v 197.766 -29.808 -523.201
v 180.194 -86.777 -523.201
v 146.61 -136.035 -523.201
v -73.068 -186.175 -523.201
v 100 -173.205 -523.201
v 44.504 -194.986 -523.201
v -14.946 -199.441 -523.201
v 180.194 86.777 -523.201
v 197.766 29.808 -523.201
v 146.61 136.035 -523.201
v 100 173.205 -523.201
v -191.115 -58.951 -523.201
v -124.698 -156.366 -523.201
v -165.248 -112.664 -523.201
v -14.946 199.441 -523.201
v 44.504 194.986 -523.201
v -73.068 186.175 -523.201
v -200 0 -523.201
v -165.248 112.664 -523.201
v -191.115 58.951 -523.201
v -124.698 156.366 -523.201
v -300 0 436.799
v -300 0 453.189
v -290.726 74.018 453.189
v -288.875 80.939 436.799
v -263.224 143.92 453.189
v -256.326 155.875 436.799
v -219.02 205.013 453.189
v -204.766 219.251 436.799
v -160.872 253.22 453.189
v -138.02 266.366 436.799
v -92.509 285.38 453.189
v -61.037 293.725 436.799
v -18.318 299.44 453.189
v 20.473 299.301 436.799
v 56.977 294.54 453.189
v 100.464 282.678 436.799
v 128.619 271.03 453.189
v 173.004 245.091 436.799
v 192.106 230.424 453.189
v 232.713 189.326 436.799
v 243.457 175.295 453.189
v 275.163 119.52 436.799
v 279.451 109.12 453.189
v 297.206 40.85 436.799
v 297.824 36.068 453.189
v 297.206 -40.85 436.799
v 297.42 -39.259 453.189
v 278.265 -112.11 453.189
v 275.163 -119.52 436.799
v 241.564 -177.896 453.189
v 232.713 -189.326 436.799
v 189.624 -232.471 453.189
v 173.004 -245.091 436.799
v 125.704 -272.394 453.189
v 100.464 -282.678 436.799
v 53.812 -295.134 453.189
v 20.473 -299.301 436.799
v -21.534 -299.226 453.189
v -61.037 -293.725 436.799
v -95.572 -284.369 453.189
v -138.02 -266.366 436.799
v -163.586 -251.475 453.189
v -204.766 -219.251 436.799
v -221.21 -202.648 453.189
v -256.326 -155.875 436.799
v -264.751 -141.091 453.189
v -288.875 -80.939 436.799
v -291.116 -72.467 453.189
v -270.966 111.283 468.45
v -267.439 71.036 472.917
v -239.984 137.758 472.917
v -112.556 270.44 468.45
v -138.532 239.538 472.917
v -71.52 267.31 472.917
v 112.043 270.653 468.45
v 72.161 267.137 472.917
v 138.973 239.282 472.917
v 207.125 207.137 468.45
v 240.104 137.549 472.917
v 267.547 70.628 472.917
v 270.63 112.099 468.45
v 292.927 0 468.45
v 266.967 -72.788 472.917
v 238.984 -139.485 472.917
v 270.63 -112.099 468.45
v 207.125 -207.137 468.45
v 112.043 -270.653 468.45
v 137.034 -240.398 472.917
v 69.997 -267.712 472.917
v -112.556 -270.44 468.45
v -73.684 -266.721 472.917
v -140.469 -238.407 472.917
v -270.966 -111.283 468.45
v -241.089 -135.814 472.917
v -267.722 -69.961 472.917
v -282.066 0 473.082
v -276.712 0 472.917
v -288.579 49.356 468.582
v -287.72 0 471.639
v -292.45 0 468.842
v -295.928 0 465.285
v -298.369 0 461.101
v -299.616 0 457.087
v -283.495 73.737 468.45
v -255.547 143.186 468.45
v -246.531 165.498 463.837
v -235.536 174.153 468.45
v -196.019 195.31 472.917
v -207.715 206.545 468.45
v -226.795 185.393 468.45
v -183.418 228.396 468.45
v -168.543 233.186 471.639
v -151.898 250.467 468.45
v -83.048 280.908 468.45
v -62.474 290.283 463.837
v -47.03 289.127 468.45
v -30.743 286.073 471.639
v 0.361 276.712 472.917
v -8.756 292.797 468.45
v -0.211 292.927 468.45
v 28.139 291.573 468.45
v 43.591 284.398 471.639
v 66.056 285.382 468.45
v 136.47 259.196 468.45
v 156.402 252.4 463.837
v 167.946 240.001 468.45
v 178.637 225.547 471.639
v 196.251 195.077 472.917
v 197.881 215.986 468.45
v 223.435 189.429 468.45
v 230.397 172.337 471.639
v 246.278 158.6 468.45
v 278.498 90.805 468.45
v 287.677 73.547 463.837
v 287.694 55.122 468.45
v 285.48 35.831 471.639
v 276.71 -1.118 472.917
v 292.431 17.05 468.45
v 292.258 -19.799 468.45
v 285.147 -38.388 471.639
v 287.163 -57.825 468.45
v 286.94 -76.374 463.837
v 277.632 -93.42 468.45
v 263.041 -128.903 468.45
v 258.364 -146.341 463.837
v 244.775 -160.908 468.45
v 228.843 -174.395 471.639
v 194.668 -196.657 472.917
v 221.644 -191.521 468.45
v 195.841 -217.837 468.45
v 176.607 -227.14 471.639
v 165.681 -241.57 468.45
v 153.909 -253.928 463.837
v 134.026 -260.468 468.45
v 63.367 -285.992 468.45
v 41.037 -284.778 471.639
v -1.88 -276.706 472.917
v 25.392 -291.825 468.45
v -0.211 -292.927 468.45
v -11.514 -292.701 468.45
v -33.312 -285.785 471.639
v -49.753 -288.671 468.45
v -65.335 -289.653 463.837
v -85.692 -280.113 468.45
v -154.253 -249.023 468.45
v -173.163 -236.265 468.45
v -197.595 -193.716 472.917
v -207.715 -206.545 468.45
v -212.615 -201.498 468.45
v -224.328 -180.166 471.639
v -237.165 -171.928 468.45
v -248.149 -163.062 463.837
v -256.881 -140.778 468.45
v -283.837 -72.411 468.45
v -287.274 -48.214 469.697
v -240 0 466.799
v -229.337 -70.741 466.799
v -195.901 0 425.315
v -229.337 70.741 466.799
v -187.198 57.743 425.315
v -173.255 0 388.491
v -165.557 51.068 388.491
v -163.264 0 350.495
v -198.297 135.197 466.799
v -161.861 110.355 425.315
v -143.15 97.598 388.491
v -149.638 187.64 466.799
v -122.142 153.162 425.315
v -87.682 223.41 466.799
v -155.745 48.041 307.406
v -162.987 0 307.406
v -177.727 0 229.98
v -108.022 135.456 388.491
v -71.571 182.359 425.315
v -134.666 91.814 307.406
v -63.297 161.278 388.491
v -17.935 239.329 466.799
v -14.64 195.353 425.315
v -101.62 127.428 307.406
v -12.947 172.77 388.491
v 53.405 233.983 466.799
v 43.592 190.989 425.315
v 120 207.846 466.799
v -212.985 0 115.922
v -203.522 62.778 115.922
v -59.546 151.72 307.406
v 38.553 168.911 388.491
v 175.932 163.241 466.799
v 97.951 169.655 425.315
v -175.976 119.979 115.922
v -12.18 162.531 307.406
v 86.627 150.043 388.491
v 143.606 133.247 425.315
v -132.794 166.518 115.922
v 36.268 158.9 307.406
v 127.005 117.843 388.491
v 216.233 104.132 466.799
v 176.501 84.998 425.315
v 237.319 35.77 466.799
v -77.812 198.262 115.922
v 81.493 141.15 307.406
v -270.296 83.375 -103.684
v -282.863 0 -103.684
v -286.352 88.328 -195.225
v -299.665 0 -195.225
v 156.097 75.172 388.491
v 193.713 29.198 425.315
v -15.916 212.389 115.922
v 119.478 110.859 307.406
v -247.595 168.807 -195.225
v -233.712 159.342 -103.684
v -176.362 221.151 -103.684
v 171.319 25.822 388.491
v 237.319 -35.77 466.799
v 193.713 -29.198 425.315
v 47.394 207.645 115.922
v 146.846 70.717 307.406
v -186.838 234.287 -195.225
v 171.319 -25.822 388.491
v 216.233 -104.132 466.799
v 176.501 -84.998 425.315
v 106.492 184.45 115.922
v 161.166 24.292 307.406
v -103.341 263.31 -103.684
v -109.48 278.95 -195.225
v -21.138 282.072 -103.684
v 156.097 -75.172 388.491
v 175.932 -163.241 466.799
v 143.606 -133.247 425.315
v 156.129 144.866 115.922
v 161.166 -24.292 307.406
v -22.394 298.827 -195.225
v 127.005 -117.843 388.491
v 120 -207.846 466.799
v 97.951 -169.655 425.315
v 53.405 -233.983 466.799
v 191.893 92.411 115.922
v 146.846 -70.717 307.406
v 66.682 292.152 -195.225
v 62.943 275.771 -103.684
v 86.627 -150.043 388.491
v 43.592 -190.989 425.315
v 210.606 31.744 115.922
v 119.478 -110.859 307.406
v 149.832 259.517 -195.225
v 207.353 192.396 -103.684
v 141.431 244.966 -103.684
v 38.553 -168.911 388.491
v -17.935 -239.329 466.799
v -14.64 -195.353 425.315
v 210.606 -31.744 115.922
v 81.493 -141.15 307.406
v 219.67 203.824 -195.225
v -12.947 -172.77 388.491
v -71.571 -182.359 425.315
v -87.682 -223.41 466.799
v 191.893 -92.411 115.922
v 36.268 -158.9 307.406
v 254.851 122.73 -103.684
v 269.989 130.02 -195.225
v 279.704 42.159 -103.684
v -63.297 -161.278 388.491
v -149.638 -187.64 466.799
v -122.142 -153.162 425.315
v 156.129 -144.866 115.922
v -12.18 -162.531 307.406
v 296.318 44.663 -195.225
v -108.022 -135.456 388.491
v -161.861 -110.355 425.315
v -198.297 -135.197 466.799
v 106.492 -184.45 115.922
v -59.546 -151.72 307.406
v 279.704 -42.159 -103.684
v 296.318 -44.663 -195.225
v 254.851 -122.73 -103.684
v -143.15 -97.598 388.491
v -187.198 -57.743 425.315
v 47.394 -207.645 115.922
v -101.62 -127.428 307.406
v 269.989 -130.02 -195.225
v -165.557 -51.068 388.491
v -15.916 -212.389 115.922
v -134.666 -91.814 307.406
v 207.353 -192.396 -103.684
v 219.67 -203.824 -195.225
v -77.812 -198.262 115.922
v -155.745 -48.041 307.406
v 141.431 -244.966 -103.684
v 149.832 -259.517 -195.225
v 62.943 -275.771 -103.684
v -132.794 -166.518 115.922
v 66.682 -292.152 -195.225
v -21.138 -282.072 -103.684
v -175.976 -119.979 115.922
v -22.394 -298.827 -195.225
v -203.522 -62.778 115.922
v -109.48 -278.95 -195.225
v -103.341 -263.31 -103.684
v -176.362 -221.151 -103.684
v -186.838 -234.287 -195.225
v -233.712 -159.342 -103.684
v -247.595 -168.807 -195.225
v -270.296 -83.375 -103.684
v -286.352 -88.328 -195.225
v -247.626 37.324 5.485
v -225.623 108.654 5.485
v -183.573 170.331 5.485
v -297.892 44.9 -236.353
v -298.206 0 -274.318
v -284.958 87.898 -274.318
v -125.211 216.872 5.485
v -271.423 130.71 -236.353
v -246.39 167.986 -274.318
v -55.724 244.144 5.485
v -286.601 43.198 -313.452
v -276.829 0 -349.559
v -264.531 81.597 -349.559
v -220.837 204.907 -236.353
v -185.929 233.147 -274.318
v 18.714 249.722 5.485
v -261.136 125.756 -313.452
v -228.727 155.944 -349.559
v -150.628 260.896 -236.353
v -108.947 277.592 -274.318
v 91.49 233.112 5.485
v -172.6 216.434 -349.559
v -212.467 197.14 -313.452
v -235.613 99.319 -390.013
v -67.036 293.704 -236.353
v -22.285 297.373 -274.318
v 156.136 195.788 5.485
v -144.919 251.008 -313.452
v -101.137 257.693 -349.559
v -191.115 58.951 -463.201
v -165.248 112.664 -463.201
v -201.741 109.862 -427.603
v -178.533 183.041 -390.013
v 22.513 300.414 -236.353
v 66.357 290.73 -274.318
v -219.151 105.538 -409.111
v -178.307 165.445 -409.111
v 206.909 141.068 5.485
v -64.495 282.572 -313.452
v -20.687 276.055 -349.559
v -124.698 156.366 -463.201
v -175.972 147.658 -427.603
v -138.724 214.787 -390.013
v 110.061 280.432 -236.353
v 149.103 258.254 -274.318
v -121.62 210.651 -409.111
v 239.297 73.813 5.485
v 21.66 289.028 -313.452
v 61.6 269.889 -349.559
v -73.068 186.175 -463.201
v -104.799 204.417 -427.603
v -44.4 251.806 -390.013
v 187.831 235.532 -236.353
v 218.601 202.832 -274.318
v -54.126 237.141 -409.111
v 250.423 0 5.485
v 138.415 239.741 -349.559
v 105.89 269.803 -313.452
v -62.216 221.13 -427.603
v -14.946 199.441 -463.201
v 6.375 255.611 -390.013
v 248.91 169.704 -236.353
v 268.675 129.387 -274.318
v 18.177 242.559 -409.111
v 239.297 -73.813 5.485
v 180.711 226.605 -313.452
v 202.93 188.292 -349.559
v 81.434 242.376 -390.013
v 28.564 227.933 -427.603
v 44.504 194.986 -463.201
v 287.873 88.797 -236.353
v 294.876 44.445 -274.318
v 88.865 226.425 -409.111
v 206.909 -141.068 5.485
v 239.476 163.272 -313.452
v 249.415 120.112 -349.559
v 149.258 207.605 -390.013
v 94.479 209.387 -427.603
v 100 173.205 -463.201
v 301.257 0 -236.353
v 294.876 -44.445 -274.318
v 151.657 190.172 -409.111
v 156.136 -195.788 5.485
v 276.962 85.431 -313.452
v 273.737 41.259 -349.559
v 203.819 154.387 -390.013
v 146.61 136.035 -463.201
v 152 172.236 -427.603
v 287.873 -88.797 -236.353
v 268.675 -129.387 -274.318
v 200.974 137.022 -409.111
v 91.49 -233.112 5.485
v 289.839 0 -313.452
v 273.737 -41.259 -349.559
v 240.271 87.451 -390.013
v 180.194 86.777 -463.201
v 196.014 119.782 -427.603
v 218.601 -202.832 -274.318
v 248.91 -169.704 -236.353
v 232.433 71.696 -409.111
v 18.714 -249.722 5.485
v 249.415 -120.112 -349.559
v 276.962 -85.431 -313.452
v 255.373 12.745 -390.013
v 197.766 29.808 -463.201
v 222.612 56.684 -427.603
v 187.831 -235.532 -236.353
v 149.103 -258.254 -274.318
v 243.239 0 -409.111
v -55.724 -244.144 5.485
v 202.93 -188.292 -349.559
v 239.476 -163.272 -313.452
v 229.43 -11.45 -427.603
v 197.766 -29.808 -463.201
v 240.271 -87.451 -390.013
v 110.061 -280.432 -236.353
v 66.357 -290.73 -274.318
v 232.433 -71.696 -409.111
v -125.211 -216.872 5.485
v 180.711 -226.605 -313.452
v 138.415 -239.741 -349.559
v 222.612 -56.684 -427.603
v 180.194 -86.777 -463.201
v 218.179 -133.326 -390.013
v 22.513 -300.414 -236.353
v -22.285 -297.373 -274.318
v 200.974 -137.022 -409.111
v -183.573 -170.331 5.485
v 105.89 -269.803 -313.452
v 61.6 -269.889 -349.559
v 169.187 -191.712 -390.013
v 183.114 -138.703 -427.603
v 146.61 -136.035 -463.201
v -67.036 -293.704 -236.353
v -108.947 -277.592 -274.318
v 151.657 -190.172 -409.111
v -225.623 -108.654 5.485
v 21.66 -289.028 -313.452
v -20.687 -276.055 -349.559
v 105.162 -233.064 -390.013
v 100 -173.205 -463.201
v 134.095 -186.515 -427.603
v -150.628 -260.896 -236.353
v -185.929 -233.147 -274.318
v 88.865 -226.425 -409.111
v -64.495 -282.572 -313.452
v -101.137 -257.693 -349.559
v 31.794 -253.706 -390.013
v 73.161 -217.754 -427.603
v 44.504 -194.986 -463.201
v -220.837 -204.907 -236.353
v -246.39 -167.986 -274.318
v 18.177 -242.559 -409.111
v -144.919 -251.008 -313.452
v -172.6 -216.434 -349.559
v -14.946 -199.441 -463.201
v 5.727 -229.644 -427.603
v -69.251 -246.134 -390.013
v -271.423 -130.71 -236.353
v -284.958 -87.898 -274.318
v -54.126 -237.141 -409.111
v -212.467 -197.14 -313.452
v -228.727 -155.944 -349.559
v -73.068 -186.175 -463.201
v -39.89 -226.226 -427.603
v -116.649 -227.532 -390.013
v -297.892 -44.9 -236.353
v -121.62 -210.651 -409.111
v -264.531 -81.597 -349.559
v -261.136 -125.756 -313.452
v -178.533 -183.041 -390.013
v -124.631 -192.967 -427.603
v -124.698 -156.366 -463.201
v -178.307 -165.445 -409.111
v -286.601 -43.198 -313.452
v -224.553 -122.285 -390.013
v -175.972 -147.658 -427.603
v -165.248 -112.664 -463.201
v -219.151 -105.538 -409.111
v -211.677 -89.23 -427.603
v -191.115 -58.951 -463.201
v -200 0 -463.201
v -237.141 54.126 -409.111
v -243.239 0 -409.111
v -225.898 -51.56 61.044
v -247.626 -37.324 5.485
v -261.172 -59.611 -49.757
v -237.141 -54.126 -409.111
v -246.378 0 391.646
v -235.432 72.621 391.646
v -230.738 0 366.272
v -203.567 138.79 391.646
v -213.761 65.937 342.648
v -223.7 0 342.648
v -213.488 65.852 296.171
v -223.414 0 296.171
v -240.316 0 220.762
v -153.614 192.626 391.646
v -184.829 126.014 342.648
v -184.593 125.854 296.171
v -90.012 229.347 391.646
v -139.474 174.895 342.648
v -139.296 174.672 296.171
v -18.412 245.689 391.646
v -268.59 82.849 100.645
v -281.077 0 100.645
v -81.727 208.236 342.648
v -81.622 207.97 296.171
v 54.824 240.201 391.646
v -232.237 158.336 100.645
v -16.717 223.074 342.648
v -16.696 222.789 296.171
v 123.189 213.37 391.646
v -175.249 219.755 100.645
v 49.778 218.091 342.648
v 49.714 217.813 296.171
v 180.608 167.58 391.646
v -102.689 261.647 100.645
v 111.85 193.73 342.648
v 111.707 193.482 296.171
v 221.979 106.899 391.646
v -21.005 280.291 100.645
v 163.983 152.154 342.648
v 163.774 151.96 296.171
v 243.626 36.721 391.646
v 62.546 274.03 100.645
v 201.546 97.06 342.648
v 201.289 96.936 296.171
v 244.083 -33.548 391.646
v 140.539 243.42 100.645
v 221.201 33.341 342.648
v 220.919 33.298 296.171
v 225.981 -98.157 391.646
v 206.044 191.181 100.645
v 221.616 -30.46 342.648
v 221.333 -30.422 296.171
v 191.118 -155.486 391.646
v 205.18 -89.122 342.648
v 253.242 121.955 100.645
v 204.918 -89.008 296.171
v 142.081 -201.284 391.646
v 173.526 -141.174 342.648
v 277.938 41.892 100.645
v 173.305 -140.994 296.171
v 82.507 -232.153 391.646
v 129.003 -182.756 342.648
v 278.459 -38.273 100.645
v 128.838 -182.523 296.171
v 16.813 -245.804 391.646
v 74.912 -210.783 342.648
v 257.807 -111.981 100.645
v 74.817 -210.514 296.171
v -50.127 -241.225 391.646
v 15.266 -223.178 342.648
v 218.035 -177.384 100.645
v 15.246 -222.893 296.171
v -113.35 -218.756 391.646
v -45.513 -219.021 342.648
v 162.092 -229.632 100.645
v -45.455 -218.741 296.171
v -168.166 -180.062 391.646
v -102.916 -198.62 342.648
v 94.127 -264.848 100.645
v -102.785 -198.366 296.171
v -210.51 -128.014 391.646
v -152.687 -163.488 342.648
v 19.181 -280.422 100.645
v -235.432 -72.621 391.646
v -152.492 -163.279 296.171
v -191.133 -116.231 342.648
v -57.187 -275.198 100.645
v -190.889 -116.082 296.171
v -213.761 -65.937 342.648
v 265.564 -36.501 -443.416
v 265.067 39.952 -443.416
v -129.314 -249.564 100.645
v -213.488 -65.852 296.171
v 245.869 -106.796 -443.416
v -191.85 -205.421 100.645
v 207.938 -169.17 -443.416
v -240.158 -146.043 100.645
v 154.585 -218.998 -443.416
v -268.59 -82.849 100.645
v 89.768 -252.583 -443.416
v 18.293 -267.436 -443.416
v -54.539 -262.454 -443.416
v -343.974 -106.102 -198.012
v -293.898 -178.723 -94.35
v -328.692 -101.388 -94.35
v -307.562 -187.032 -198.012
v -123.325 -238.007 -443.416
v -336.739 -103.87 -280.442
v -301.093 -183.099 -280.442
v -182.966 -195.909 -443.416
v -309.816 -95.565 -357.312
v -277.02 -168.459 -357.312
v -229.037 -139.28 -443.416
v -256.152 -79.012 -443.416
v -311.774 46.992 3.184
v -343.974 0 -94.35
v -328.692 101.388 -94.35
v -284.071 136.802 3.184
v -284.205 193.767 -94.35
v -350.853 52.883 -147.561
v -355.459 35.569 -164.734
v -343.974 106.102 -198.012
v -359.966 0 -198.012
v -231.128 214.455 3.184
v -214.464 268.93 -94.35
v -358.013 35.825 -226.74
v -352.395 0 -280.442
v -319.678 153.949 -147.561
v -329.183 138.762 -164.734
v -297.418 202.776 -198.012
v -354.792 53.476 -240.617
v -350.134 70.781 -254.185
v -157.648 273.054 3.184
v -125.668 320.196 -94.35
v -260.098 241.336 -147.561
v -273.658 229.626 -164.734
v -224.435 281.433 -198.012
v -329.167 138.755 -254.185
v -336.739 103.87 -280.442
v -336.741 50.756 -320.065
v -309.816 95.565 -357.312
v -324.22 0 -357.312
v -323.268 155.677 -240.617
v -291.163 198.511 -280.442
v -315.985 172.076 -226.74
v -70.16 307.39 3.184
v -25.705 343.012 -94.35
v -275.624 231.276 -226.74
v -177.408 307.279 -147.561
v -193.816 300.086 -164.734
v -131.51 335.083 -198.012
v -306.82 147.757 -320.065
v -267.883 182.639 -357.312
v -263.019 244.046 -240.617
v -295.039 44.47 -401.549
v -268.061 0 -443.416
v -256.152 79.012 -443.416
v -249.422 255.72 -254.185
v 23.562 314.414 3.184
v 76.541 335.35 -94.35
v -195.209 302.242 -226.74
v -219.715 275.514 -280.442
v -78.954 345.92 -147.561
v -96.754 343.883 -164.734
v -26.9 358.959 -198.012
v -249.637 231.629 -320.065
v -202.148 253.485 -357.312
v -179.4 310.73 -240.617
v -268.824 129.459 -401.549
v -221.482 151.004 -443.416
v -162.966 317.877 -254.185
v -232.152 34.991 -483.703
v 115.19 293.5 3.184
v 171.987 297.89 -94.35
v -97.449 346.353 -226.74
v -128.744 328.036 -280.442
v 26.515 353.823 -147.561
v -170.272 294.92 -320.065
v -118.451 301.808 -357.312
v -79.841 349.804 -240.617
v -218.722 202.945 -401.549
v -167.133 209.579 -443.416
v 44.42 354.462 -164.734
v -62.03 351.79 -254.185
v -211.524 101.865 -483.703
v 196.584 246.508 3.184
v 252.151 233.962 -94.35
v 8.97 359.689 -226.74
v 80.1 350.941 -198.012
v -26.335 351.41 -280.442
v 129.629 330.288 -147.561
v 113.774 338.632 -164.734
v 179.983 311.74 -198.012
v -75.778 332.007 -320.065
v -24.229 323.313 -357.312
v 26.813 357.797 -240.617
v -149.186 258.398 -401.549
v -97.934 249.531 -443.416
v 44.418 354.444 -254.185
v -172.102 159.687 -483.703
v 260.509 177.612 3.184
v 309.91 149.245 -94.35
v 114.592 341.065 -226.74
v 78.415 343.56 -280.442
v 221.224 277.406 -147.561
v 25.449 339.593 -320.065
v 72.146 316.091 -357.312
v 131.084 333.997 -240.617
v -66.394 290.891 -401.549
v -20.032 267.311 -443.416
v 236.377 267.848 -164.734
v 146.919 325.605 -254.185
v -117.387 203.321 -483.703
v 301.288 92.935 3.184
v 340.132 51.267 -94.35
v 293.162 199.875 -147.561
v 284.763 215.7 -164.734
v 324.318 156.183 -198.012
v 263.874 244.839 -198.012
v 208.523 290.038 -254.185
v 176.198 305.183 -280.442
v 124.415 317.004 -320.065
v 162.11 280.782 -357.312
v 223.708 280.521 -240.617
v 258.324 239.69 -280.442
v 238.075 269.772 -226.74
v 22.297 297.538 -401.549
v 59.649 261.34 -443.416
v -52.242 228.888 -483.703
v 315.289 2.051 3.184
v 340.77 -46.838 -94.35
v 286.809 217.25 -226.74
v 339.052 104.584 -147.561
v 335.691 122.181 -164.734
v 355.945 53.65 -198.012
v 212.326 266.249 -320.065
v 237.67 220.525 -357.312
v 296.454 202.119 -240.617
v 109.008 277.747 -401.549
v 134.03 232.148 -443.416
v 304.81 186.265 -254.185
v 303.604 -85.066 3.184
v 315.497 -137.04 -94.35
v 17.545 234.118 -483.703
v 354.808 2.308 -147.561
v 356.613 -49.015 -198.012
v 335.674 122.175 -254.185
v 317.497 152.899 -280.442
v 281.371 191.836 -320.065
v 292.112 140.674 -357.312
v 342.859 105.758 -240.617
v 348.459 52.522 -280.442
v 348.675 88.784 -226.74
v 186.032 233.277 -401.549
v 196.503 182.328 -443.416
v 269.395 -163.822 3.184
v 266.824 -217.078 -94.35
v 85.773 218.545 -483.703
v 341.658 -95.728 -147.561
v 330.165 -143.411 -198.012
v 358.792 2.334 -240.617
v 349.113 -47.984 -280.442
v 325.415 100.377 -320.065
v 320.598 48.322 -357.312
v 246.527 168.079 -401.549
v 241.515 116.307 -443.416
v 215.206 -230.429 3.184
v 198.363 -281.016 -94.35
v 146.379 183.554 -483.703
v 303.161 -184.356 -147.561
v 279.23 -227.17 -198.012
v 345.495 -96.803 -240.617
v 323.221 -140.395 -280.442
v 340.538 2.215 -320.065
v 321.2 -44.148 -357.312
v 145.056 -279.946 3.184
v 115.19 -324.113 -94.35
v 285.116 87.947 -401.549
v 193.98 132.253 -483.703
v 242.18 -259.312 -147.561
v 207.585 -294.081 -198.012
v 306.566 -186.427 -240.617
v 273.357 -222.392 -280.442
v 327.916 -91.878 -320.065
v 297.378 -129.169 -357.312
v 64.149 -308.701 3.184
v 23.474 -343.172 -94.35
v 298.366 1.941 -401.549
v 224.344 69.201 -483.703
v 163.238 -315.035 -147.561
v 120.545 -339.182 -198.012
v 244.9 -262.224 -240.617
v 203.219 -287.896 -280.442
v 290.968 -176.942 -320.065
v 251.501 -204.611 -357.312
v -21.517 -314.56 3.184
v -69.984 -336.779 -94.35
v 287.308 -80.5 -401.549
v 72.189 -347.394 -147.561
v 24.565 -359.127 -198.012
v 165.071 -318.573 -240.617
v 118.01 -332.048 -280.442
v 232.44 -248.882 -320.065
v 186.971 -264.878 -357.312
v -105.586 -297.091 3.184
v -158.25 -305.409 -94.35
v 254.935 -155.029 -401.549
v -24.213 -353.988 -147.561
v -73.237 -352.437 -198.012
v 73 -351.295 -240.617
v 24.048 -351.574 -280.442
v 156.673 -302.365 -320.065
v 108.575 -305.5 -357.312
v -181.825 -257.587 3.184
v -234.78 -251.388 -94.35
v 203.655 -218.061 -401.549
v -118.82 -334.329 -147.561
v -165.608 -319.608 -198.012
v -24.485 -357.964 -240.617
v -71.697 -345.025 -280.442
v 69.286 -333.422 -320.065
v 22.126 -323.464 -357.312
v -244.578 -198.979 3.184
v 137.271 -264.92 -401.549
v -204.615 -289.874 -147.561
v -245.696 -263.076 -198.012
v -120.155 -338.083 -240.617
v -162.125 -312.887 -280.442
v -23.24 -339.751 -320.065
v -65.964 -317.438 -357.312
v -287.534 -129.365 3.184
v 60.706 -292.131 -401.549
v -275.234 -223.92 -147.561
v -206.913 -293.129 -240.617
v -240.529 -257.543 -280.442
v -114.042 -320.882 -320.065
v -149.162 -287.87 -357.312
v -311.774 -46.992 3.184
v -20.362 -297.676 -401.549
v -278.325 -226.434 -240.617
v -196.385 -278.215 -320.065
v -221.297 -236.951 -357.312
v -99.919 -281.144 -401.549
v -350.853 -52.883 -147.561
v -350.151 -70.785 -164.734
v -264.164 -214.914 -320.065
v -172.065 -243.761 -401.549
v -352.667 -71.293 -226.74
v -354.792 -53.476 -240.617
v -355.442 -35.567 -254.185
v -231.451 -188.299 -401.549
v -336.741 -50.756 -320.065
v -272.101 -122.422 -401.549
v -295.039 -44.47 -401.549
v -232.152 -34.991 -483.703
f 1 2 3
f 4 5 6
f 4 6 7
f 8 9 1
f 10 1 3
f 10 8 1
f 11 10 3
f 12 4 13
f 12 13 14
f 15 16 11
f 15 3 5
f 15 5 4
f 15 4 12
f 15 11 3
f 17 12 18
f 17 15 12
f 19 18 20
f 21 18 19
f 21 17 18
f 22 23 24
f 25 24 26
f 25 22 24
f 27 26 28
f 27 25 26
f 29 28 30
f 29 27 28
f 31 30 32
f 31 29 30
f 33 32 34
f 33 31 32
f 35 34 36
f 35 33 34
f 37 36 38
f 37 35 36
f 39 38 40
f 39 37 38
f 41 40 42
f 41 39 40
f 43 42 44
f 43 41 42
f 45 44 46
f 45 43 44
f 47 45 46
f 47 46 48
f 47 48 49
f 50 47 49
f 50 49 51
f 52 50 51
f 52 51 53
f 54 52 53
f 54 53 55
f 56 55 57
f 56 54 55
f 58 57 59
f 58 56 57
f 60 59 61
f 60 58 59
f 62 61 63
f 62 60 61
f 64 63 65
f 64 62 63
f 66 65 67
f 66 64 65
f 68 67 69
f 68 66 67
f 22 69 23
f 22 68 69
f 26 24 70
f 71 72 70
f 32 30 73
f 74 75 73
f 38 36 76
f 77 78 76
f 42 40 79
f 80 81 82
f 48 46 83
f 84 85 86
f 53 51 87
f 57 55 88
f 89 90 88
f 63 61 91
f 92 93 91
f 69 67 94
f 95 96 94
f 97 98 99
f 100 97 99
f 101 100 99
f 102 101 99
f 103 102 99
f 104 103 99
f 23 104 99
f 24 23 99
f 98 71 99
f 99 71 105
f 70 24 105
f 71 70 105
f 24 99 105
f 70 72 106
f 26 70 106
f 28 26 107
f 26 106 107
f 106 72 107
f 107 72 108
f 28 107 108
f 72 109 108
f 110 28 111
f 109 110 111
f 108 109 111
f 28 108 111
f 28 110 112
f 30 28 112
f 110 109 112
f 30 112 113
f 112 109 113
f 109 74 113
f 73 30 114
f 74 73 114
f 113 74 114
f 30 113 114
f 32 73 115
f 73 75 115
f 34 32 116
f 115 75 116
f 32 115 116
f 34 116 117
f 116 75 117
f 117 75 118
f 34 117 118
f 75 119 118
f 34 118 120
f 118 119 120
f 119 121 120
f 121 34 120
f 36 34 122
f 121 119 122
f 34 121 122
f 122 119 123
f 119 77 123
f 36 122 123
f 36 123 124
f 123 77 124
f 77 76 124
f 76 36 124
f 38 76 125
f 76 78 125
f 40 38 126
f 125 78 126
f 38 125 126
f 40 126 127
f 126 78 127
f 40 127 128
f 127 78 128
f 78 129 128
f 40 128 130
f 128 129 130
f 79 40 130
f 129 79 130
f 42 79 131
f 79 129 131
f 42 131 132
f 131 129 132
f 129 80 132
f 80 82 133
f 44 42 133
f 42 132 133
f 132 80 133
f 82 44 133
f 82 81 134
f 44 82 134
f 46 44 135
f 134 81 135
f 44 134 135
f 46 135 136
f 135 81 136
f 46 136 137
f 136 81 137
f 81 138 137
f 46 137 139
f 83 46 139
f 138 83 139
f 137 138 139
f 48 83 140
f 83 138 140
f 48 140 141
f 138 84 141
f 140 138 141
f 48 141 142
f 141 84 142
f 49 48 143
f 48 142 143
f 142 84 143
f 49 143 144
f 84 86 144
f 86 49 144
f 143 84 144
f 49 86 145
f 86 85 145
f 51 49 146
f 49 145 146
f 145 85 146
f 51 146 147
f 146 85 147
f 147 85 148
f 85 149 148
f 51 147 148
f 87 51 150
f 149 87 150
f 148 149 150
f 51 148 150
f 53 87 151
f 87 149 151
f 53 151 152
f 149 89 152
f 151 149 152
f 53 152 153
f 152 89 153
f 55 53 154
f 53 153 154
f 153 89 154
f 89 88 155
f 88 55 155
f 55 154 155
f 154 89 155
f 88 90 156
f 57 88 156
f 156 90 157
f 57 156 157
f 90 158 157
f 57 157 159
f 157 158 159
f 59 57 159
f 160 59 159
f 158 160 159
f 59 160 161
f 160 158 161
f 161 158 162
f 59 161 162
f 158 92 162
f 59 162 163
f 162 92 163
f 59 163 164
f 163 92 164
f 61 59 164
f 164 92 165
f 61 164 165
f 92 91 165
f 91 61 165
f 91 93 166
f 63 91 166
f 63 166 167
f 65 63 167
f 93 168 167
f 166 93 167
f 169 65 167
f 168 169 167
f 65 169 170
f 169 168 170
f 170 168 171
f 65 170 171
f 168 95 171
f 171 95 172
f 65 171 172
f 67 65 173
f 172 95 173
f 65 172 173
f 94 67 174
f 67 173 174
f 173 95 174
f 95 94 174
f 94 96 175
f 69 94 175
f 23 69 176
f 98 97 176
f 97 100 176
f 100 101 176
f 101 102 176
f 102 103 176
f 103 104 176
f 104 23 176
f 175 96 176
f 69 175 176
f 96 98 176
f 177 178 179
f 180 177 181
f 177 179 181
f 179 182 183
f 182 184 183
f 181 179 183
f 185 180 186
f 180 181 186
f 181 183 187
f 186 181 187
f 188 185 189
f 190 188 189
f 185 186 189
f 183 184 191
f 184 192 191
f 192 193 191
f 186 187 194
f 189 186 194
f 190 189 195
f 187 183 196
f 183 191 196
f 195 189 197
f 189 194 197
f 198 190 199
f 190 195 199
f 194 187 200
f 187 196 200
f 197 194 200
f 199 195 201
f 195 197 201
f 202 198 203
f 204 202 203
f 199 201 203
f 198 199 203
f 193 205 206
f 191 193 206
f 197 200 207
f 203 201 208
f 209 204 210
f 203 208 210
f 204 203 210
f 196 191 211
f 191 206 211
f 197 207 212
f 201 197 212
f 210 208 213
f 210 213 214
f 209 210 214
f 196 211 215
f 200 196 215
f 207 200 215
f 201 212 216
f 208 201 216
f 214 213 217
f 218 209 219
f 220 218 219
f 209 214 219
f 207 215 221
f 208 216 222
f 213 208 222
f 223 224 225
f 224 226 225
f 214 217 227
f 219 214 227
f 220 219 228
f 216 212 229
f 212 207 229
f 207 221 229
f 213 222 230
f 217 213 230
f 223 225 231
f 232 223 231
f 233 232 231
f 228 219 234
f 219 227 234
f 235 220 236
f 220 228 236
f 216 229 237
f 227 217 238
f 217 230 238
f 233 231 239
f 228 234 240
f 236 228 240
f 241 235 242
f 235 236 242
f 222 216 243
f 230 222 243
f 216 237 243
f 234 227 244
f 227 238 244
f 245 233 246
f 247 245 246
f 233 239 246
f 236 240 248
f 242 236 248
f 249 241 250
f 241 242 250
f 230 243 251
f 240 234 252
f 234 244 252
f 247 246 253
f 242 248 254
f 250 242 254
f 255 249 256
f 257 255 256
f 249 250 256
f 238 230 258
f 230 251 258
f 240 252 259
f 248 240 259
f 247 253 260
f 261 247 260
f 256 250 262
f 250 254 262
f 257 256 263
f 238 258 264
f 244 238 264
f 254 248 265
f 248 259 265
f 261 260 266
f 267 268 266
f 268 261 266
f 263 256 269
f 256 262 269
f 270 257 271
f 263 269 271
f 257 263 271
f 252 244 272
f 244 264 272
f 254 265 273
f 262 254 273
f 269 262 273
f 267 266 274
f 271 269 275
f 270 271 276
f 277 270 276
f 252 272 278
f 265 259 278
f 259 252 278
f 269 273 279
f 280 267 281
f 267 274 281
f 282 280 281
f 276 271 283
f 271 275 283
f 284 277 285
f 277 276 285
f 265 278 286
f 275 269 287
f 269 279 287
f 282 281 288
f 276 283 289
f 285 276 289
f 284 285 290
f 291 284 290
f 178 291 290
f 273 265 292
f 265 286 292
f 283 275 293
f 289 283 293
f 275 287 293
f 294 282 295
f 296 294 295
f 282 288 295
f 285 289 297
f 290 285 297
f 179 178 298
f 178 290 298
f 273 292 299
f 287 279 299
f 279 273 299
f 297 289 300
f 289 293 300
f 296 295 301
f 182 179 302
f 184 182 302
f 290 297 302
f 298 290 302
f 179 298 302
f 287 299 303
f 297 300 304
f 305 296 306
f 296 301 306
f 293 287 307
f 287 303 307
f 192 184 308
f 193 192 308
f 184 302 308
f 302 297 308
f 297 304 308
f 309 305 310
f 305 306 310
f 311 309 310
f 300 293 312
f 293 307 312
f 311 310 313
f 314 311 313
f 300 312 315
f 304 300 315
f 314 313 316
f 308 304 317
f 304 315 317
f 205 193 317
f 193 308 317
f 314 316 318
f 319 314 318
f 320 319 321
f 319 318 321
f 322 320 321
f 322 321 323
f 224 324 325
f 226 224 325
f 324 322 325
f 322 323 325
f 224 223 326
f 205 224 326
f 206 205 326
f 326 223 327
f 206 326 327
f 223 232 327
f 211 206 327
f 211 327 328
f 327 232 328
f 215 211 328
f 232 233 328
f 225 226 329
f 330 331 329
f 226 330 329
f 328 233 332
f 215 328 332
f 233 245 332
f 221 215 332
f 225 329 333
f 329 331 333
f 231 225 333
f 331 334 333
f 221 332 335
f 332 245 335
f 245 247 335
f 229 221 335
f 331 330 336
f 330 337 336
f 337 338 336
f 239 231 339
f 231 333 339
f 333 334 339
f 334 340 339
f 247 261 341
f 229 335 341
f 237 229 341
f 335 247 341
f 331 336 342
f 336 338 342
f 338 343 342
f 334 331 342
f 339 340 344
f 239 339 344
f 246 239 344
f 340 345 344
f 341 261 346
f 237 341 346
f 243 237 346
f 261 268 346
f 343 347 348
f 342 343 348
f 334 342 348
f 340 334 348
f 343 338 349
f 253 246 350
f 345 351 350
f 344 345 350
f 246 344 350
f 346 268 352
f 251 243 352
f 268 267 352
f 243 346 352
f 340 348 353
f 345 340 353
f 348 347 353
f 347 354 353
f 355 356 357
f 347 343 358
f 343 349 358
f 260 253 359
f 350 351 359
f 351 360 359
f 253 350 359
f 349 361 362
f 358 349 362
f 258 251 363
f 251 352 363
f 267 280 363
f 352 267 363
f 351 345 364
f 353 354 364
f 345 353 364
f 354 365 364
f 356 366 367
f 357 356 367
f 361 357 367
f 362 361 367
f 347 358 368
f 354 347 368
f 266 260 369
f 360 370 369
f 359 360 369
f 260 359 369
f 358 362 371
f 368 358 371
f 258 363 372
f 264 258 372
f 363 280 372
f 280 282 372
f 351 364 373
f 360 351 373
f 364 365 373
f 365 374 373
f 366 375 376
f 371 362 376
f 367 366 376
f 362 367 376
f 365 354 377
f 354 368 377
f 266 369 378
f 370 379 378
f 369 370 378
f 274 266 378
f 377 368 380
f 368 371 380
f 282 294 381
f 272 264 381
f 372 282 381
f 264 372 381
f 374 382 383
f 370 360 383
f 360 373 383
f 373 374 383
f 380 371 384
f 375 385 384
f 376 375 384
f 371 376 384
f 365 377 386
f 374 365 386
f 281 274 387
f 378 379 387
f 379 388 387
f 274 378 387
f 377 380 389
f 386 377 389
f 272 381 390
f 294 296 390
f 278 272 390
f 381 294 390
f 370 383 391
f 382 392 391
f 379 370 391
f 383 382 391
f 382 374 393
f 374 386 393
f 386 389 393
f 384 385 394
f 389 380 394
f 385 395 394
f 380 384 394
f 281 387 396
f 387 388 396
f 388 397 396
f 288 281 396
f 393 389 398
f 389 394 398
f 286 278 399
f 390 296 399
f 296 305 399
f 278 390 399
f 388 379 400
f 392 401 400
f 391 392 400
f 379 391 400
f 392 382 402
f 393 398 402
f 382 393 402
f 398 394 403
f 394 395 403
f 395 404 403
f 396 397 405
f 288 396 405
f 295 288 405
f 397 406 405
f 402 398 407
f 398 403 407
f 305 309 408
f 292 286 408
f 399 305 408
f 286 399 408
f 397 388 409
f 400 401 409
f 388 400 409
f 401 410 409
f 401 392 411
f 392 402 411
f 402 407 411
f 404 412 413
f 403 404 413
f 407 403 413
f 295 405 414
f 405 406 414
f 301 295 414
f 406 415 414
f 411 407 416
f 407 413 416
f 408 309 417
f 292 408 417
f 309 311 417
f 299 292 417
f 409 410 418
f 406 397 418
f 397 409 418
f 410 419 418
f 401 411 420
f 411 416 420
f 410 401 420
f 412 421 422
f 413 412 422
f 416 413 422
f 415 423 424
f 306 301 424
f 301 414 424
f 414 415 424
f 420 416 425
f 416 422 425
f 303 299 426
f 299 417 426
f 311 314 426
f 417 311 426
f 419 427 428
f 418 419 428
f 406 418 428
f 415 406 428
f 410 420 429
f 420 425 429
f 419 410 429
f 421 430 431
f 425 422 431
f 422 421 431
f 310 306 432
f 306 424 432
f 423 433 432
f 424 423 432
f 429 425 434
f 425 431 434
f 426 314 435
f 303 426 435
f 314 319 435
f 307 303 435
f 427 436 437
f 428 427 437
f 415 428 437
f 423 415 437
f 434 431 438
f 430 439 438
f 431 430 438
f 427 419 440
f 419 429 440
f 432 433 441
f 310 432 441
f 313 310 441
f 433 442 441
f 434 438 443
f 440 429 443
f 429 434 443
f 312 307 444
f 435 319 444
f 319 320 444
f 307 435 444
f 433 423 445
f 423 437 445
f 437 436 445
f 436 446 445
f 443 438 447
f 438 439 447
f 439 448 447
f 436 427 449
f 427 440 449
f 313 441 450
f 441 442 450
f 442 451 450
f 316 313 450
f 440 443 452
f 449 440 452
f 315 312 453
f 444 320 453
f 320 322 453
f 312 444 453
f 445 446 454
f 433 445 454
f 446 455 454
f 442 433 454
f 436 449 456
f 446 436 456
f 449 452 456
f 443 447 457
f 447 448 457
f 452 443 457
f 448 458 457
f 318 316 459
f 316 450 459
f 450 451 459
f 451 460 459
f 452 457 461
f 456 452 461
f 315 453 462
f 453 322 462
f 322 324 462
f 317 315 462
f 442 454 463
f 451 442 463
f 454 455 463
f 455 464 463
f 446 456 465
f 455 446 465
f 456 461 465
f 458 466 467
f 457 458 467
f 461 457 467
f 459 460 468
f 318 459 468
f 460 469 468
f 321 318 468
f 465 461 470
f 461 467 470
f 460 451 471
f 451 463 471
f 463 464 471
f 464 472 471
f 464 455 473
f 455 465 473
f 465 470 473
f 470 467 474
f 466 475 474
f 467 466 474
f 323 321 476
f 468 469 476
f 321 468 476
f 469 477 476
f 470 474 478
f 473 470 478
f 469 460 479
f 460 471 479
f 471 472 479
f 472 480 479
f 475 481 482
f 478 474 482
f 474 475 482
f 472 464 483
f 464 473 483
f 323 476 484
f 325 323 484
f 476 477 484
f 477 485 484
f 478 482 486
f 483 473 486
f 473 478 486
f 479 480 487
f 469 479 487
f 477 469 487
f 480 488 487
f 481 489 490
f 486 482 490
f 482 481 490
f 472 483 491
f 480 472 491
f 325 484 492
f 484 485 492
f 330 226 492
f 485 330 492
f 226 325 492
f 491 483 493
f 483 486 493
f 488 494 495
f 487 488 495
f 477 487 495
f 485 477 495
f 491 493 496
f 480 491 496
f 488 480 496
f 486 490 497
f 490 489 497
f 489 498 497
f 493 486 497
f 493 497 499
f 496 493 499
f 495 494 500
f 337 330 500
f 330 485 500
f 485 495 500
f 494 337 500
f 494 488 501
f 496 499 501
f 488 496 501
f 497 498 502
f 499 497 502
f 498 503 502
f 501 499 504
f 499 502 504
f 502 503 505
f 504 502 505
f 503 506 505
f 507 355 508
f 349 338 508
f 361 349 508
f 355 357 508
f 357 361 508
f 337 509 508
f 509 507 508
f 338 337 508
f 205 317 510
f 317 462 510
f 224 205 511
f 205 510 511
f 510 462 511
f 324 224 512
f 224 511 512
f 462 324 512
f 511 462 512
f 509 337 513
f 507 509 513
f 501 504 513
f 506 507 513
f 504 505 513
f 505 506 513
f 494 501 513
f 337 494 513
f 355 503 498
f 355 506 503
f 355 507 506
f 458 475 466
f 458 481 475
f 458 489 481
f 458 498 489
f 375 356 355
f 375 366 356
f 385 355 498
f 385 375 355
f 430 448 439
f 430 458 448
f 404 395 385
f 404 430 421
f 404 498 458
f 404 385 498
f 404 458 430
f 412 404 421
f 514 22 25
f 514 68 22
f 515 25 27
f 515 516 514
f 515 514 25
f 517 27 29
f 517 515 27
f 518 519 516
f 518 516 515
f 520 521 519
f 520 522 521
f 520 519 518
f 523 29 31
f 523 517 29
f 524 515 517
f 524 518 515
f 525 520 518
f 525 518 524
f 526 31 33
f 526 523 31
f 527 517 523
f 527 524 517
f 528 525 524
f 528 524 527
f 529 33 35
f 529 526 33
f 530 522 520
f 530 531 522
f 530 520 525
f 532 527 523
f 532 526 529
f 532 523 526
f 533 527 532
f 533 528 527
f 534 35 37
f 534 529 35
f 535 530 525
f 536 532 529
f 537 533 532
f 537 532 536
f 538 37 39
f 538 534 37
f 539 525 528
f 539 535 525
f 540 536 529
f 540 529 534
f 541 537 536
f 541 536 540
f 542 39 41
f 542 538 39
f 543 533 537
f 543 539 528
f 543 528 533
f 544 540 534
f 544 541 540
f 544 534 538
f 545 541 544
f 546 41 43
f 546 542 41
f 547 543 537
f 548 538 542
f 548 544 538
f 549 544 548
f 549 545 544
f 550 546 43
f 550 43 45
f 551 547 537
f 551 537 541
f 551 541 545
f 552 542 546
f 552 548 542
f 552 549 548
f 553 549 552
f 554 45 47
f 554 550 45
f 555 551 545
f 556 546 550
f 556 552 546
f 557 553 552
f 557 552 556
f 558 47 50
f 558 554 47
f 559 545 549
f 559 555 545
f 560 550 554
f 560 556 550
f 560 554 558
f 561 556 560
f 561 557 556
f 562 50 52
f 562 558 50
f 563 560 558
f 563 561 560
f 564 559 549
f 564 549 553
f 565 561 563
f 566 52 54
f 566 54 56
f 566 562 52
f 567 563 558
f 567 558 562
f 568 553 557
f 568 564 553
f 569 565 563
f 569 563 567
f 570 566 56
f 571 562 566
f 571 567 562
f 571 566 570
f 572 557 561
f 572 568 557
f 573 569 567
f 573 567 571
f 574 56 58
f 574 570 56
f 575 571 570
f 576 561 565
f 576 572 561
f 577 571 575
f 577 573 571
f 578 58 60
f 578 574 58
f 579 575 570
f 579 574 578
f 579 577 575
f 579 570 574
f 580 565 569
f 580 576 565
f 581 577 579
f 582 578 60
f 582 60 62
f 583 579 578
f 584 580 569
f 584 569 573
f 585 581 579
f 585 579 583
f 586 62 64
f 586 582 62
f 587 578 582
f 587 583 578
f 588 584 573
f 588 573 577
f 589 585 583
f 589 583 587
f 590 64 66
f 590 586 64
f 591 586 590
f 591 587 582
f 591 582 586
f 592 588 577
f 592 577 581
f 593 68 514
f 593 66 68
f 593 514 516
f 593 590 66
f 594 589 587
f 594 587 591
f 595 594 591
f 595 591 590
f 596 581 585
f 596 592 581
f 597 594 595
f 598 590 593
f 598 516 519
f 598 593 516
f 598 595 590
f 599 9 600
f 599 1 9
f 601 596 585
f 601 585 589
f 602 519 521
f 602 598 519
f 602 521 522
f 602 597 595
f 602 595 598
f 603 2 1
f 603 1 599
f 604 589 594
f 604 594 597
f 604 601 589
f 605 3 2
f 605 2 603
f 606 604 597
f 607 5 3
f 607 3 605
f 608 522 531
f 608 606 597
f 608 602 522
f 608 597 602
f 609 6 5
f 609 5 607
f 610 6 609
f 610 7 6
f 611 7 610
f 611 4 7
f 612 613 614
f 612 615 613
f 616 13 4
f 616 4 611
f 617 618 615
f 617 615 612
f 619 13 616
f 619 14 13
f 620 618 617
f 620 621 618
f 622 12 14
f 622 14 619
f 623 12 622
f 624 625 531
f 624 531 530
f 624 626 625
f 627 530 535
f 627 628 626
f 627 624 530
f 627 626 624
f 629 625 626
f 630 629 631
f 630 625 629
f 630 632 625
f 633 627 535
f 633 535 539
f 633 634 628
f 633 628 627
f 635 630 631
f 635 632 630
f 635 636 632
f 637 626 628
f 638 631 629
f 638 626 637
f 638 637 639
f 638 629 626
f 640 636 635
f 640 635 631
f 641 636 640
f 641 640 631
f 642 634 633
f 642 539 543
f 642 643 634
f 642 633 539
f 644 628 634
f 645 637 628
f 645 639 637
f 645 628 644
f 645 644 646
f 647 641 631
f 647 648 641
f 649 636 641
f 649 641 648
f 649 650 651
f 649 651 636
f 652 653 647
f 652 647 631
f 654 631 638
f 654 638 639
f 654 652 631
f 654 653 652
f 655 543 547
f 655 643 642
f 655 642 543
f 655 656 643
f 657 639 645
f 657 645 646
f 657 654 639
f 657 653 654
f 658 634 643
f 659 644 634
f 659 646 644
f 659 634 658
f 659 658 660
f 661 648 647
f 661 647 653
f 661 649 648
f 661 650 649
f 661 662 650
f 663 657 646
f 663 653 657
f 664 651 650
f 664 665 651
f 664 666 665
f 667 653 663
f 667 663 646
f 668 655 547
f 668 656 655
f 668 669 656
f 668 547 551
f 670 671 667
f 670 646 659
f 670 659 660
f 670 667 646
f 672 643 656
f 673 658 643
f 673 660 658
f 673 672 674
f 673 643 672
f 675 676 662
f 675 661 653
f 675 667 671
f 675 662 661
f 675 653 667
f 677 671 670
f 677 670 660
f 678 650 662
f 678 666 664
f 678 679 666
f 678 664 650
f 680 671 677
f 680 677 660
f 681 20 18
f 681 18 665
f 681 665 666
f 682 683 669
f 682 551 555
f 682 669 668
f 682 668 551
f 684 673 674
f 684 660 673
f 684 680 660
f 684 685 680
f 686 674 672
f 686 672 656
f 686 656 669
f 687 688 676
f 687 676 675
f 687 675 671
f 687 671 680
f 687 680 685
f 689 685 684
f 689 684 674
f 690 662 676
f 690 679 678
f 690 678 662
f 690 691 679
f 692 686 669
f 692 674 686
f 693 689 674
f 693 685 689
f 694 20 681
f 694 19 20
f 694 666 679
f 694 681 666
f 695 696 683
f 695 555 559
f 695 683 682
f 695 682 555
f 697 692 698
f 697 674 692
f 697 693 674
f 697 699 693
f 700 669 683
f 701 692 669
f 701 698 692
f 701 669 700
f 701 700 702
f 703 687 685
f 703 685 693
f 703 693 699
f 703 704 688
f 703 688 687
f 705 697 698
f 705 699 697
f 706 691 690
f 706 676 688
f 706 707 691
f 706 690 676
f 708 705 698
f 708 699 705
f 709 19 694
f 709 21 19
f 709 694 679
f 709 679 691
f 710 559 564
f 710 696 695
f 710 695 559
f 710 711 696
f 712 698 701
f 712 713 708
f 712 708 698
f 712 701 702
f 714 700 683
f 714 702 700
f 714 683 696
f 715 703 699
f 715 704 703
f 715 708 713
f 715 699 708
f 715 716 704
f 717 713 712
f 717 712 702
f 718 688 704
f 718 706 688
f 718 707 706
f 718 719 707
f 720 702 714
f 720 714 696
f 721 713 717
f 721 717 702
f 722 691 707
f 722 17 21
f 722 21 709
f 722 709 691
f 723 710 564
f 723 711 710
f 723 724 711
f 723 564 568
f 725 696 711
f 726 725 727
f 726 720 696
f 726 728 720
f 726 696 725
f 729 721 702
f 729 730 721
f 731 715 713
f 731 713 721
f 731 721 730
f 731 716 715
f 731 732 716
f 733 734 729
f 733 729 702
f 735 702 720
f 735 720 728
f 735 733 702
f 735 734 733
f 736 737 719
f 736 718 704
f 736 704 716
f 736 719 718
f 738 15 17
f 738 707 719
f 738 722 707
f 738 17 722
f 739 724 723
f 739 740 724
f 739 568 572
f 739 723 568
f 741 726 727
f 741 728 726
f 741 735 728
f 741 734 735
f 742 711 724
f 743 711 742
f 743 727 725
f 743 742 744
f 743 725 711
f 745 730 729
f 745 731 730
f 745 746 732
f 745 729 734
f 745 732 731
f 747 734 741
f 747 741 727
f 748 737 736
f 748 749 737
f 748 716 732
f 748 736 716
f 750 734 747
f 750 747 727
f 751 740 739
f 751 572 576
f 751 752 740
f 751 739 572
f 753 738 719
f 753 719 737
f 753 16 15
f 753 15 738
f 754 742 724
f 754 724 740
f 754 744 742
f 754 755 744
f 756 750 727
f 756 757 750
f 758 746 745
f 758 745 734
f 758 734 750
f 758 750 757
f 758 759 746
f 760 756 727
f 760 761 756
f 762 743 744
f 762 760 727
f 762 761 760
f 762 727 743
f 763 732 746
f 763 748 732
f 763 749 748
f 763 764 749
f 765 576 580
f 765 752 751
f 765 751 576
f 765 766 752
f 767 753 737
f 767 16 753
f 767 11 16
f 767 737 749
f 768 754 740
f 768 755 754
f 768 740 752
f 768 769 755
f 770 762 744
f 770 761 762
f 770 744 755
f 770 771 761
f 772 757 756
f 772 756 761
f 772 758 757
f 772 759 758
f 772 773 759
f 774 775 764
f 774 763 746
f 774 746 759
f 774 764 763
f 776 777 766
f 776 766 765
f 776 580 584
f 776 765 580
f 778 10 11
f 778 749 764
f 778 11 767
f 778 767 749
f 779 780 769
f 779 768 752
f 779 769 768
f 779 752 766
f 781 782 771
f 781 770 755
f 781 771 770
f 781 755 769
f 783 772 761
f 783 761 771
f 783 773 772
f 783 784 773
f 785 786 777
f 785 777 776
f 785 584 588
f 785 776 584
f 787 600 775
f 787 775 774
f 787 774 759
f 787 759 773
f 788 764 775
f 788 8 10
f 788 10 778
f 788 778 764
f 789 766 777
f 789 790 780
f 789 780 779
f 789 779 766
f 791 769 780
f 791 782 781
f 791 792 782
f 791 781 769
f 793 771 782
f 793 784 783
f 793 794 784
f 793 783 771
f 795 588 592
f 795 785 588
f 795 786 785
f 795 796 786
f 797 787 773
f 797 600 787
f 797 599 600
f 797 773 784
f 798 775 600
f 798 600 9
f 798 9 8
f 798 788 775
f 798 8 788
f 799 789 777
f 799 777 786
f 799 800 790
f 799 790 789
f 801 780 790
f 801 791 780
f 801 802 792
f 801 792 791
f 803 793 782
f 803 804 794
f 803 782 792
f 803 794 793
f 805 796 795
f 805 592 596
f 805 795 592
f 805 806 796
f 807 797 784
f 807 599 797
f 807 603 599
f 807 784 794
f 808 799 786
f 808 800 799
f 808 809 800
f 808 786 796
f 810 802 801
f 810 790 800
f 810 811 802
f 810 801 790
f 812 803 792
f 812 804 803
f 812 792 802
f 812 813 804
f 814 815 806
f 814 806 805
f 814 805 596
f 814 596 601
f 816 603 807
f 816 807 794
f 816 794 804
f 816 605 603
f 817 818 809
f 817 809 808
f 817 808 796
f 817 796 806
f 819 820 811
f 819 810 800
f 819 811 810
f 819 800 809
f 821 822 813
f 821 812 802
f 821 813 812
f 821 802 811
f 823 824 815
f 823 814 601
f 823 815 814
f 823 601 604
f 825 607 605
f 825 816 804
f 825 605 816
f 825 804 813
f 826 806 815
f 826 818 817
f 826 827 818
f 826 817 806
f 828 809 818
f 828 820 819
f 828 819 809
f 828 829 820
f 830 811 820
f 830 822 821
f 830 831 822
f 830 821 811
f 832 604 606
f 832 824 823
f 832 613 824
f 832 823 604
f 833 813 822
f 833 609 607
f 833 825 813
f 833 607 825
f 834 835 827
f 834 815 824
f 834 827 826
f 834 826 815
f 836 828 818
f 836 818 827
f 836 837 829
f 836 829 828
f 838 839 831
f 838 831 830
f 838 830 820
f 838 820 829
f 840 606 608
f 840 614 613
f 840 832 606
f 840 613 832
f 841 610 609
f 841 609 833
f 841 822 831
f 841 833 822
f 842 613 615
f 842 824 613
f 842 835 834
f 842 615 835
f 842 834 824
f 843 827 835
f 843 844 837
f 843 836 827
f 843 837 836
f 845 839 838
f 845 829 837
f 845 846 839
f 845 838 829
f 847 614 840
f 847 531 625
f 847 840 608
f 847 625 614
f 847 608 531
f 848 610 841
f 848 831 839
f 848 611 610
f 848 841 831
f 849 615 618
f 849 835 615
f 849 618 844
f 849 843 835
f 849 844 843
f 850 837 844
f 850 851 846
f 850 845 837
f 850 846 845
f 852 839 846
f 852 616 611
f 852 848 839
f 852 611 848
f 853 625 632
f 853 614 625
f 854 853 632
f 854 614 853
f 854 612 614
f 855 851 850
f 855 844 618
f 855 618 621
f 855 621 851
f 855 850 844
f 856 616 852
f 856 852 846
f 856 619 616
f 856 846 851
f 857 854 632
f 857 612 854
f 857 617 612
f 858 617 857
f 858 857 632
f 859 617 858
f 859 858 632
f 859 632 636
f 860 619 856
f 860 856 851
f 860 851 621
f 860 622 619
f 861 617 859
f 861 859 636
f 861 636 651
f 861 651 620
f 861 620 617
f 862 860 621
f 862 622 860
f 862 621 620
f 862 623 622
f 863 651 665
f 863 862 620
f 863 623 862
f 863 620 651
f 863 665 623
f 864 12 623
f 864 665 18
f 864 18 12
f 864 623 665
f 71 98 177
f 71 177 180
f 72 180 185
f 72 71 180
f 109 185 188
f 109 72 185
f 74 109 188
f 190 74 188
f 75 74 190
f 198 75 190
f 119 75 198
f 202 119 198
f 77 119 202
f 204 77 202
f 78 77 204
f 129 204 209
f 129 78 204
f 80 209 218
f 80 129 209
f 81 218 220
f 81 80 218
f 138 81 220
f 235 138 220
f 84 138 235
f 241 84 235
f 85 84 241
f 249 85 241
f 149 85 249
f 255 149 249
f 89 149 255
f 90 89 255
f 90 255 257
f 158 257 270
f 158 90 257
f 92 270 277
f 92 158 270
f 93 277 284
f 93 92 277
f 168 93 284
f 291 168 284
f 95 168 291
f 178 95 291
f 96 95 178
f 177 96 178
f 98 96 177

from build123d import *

# Parameters (mm, degrees)
F2_R = 20


with BuildPart() as f1:
    # F0 (on Front) → F1 (revolve)
    with BuildSketch(Plane.XZ):
        with BuildLine():
            Line((-240, 466.798542738), (-300, 476.798542738))
            Line((-300, 476.798542738), (-300, 436.798542738))
            add(Edge.make_bspline(
                [(-300, 436.798542738), (-262.2185359686, 410.373573585), (-148.6746493755, 330.9591364358), (-465.8704913896, -224.3531432487), (-282.4203722429, -430.5578955173), (-200, -523.201457262)],
                knots=[0, 0, 0, 0, 0.2154618029, 0.6475230949, 1, 1, 1, 1], degree=3))
            Line((-200, -523.201457262), (0, -523.201457262))
            Line((0, -523.201457262), (0, -463.201457262))
            Line((0, -463.201457262), (-200, -463.201457262))
            add(Edge.make_bspline(
                [(-240, 466.798542738), (-196.3961405941, 432.1257214979), (-96.5203675588, 328.2636183542), (-374.9004659051, -208.2607791995), (-263.042873483, -392.7398806467), (-200, -463.201457262)],
                knots=[0, 0, 0, 0, 0.240023517, 0.6815760983, 1, 1, 1, 1], degree=3))
        make_face()
    revolve(axis=Axis((0, 0, -23.201457262), (0, 0, -1)))

    # F2
    f2_edges = [f1.edges().sort_by_distance(p)[0] for p in [
        (300, 0, 476.798543),
    ]]
    fillet(f2_edges, radius=F2_R)


solid = f1.part
